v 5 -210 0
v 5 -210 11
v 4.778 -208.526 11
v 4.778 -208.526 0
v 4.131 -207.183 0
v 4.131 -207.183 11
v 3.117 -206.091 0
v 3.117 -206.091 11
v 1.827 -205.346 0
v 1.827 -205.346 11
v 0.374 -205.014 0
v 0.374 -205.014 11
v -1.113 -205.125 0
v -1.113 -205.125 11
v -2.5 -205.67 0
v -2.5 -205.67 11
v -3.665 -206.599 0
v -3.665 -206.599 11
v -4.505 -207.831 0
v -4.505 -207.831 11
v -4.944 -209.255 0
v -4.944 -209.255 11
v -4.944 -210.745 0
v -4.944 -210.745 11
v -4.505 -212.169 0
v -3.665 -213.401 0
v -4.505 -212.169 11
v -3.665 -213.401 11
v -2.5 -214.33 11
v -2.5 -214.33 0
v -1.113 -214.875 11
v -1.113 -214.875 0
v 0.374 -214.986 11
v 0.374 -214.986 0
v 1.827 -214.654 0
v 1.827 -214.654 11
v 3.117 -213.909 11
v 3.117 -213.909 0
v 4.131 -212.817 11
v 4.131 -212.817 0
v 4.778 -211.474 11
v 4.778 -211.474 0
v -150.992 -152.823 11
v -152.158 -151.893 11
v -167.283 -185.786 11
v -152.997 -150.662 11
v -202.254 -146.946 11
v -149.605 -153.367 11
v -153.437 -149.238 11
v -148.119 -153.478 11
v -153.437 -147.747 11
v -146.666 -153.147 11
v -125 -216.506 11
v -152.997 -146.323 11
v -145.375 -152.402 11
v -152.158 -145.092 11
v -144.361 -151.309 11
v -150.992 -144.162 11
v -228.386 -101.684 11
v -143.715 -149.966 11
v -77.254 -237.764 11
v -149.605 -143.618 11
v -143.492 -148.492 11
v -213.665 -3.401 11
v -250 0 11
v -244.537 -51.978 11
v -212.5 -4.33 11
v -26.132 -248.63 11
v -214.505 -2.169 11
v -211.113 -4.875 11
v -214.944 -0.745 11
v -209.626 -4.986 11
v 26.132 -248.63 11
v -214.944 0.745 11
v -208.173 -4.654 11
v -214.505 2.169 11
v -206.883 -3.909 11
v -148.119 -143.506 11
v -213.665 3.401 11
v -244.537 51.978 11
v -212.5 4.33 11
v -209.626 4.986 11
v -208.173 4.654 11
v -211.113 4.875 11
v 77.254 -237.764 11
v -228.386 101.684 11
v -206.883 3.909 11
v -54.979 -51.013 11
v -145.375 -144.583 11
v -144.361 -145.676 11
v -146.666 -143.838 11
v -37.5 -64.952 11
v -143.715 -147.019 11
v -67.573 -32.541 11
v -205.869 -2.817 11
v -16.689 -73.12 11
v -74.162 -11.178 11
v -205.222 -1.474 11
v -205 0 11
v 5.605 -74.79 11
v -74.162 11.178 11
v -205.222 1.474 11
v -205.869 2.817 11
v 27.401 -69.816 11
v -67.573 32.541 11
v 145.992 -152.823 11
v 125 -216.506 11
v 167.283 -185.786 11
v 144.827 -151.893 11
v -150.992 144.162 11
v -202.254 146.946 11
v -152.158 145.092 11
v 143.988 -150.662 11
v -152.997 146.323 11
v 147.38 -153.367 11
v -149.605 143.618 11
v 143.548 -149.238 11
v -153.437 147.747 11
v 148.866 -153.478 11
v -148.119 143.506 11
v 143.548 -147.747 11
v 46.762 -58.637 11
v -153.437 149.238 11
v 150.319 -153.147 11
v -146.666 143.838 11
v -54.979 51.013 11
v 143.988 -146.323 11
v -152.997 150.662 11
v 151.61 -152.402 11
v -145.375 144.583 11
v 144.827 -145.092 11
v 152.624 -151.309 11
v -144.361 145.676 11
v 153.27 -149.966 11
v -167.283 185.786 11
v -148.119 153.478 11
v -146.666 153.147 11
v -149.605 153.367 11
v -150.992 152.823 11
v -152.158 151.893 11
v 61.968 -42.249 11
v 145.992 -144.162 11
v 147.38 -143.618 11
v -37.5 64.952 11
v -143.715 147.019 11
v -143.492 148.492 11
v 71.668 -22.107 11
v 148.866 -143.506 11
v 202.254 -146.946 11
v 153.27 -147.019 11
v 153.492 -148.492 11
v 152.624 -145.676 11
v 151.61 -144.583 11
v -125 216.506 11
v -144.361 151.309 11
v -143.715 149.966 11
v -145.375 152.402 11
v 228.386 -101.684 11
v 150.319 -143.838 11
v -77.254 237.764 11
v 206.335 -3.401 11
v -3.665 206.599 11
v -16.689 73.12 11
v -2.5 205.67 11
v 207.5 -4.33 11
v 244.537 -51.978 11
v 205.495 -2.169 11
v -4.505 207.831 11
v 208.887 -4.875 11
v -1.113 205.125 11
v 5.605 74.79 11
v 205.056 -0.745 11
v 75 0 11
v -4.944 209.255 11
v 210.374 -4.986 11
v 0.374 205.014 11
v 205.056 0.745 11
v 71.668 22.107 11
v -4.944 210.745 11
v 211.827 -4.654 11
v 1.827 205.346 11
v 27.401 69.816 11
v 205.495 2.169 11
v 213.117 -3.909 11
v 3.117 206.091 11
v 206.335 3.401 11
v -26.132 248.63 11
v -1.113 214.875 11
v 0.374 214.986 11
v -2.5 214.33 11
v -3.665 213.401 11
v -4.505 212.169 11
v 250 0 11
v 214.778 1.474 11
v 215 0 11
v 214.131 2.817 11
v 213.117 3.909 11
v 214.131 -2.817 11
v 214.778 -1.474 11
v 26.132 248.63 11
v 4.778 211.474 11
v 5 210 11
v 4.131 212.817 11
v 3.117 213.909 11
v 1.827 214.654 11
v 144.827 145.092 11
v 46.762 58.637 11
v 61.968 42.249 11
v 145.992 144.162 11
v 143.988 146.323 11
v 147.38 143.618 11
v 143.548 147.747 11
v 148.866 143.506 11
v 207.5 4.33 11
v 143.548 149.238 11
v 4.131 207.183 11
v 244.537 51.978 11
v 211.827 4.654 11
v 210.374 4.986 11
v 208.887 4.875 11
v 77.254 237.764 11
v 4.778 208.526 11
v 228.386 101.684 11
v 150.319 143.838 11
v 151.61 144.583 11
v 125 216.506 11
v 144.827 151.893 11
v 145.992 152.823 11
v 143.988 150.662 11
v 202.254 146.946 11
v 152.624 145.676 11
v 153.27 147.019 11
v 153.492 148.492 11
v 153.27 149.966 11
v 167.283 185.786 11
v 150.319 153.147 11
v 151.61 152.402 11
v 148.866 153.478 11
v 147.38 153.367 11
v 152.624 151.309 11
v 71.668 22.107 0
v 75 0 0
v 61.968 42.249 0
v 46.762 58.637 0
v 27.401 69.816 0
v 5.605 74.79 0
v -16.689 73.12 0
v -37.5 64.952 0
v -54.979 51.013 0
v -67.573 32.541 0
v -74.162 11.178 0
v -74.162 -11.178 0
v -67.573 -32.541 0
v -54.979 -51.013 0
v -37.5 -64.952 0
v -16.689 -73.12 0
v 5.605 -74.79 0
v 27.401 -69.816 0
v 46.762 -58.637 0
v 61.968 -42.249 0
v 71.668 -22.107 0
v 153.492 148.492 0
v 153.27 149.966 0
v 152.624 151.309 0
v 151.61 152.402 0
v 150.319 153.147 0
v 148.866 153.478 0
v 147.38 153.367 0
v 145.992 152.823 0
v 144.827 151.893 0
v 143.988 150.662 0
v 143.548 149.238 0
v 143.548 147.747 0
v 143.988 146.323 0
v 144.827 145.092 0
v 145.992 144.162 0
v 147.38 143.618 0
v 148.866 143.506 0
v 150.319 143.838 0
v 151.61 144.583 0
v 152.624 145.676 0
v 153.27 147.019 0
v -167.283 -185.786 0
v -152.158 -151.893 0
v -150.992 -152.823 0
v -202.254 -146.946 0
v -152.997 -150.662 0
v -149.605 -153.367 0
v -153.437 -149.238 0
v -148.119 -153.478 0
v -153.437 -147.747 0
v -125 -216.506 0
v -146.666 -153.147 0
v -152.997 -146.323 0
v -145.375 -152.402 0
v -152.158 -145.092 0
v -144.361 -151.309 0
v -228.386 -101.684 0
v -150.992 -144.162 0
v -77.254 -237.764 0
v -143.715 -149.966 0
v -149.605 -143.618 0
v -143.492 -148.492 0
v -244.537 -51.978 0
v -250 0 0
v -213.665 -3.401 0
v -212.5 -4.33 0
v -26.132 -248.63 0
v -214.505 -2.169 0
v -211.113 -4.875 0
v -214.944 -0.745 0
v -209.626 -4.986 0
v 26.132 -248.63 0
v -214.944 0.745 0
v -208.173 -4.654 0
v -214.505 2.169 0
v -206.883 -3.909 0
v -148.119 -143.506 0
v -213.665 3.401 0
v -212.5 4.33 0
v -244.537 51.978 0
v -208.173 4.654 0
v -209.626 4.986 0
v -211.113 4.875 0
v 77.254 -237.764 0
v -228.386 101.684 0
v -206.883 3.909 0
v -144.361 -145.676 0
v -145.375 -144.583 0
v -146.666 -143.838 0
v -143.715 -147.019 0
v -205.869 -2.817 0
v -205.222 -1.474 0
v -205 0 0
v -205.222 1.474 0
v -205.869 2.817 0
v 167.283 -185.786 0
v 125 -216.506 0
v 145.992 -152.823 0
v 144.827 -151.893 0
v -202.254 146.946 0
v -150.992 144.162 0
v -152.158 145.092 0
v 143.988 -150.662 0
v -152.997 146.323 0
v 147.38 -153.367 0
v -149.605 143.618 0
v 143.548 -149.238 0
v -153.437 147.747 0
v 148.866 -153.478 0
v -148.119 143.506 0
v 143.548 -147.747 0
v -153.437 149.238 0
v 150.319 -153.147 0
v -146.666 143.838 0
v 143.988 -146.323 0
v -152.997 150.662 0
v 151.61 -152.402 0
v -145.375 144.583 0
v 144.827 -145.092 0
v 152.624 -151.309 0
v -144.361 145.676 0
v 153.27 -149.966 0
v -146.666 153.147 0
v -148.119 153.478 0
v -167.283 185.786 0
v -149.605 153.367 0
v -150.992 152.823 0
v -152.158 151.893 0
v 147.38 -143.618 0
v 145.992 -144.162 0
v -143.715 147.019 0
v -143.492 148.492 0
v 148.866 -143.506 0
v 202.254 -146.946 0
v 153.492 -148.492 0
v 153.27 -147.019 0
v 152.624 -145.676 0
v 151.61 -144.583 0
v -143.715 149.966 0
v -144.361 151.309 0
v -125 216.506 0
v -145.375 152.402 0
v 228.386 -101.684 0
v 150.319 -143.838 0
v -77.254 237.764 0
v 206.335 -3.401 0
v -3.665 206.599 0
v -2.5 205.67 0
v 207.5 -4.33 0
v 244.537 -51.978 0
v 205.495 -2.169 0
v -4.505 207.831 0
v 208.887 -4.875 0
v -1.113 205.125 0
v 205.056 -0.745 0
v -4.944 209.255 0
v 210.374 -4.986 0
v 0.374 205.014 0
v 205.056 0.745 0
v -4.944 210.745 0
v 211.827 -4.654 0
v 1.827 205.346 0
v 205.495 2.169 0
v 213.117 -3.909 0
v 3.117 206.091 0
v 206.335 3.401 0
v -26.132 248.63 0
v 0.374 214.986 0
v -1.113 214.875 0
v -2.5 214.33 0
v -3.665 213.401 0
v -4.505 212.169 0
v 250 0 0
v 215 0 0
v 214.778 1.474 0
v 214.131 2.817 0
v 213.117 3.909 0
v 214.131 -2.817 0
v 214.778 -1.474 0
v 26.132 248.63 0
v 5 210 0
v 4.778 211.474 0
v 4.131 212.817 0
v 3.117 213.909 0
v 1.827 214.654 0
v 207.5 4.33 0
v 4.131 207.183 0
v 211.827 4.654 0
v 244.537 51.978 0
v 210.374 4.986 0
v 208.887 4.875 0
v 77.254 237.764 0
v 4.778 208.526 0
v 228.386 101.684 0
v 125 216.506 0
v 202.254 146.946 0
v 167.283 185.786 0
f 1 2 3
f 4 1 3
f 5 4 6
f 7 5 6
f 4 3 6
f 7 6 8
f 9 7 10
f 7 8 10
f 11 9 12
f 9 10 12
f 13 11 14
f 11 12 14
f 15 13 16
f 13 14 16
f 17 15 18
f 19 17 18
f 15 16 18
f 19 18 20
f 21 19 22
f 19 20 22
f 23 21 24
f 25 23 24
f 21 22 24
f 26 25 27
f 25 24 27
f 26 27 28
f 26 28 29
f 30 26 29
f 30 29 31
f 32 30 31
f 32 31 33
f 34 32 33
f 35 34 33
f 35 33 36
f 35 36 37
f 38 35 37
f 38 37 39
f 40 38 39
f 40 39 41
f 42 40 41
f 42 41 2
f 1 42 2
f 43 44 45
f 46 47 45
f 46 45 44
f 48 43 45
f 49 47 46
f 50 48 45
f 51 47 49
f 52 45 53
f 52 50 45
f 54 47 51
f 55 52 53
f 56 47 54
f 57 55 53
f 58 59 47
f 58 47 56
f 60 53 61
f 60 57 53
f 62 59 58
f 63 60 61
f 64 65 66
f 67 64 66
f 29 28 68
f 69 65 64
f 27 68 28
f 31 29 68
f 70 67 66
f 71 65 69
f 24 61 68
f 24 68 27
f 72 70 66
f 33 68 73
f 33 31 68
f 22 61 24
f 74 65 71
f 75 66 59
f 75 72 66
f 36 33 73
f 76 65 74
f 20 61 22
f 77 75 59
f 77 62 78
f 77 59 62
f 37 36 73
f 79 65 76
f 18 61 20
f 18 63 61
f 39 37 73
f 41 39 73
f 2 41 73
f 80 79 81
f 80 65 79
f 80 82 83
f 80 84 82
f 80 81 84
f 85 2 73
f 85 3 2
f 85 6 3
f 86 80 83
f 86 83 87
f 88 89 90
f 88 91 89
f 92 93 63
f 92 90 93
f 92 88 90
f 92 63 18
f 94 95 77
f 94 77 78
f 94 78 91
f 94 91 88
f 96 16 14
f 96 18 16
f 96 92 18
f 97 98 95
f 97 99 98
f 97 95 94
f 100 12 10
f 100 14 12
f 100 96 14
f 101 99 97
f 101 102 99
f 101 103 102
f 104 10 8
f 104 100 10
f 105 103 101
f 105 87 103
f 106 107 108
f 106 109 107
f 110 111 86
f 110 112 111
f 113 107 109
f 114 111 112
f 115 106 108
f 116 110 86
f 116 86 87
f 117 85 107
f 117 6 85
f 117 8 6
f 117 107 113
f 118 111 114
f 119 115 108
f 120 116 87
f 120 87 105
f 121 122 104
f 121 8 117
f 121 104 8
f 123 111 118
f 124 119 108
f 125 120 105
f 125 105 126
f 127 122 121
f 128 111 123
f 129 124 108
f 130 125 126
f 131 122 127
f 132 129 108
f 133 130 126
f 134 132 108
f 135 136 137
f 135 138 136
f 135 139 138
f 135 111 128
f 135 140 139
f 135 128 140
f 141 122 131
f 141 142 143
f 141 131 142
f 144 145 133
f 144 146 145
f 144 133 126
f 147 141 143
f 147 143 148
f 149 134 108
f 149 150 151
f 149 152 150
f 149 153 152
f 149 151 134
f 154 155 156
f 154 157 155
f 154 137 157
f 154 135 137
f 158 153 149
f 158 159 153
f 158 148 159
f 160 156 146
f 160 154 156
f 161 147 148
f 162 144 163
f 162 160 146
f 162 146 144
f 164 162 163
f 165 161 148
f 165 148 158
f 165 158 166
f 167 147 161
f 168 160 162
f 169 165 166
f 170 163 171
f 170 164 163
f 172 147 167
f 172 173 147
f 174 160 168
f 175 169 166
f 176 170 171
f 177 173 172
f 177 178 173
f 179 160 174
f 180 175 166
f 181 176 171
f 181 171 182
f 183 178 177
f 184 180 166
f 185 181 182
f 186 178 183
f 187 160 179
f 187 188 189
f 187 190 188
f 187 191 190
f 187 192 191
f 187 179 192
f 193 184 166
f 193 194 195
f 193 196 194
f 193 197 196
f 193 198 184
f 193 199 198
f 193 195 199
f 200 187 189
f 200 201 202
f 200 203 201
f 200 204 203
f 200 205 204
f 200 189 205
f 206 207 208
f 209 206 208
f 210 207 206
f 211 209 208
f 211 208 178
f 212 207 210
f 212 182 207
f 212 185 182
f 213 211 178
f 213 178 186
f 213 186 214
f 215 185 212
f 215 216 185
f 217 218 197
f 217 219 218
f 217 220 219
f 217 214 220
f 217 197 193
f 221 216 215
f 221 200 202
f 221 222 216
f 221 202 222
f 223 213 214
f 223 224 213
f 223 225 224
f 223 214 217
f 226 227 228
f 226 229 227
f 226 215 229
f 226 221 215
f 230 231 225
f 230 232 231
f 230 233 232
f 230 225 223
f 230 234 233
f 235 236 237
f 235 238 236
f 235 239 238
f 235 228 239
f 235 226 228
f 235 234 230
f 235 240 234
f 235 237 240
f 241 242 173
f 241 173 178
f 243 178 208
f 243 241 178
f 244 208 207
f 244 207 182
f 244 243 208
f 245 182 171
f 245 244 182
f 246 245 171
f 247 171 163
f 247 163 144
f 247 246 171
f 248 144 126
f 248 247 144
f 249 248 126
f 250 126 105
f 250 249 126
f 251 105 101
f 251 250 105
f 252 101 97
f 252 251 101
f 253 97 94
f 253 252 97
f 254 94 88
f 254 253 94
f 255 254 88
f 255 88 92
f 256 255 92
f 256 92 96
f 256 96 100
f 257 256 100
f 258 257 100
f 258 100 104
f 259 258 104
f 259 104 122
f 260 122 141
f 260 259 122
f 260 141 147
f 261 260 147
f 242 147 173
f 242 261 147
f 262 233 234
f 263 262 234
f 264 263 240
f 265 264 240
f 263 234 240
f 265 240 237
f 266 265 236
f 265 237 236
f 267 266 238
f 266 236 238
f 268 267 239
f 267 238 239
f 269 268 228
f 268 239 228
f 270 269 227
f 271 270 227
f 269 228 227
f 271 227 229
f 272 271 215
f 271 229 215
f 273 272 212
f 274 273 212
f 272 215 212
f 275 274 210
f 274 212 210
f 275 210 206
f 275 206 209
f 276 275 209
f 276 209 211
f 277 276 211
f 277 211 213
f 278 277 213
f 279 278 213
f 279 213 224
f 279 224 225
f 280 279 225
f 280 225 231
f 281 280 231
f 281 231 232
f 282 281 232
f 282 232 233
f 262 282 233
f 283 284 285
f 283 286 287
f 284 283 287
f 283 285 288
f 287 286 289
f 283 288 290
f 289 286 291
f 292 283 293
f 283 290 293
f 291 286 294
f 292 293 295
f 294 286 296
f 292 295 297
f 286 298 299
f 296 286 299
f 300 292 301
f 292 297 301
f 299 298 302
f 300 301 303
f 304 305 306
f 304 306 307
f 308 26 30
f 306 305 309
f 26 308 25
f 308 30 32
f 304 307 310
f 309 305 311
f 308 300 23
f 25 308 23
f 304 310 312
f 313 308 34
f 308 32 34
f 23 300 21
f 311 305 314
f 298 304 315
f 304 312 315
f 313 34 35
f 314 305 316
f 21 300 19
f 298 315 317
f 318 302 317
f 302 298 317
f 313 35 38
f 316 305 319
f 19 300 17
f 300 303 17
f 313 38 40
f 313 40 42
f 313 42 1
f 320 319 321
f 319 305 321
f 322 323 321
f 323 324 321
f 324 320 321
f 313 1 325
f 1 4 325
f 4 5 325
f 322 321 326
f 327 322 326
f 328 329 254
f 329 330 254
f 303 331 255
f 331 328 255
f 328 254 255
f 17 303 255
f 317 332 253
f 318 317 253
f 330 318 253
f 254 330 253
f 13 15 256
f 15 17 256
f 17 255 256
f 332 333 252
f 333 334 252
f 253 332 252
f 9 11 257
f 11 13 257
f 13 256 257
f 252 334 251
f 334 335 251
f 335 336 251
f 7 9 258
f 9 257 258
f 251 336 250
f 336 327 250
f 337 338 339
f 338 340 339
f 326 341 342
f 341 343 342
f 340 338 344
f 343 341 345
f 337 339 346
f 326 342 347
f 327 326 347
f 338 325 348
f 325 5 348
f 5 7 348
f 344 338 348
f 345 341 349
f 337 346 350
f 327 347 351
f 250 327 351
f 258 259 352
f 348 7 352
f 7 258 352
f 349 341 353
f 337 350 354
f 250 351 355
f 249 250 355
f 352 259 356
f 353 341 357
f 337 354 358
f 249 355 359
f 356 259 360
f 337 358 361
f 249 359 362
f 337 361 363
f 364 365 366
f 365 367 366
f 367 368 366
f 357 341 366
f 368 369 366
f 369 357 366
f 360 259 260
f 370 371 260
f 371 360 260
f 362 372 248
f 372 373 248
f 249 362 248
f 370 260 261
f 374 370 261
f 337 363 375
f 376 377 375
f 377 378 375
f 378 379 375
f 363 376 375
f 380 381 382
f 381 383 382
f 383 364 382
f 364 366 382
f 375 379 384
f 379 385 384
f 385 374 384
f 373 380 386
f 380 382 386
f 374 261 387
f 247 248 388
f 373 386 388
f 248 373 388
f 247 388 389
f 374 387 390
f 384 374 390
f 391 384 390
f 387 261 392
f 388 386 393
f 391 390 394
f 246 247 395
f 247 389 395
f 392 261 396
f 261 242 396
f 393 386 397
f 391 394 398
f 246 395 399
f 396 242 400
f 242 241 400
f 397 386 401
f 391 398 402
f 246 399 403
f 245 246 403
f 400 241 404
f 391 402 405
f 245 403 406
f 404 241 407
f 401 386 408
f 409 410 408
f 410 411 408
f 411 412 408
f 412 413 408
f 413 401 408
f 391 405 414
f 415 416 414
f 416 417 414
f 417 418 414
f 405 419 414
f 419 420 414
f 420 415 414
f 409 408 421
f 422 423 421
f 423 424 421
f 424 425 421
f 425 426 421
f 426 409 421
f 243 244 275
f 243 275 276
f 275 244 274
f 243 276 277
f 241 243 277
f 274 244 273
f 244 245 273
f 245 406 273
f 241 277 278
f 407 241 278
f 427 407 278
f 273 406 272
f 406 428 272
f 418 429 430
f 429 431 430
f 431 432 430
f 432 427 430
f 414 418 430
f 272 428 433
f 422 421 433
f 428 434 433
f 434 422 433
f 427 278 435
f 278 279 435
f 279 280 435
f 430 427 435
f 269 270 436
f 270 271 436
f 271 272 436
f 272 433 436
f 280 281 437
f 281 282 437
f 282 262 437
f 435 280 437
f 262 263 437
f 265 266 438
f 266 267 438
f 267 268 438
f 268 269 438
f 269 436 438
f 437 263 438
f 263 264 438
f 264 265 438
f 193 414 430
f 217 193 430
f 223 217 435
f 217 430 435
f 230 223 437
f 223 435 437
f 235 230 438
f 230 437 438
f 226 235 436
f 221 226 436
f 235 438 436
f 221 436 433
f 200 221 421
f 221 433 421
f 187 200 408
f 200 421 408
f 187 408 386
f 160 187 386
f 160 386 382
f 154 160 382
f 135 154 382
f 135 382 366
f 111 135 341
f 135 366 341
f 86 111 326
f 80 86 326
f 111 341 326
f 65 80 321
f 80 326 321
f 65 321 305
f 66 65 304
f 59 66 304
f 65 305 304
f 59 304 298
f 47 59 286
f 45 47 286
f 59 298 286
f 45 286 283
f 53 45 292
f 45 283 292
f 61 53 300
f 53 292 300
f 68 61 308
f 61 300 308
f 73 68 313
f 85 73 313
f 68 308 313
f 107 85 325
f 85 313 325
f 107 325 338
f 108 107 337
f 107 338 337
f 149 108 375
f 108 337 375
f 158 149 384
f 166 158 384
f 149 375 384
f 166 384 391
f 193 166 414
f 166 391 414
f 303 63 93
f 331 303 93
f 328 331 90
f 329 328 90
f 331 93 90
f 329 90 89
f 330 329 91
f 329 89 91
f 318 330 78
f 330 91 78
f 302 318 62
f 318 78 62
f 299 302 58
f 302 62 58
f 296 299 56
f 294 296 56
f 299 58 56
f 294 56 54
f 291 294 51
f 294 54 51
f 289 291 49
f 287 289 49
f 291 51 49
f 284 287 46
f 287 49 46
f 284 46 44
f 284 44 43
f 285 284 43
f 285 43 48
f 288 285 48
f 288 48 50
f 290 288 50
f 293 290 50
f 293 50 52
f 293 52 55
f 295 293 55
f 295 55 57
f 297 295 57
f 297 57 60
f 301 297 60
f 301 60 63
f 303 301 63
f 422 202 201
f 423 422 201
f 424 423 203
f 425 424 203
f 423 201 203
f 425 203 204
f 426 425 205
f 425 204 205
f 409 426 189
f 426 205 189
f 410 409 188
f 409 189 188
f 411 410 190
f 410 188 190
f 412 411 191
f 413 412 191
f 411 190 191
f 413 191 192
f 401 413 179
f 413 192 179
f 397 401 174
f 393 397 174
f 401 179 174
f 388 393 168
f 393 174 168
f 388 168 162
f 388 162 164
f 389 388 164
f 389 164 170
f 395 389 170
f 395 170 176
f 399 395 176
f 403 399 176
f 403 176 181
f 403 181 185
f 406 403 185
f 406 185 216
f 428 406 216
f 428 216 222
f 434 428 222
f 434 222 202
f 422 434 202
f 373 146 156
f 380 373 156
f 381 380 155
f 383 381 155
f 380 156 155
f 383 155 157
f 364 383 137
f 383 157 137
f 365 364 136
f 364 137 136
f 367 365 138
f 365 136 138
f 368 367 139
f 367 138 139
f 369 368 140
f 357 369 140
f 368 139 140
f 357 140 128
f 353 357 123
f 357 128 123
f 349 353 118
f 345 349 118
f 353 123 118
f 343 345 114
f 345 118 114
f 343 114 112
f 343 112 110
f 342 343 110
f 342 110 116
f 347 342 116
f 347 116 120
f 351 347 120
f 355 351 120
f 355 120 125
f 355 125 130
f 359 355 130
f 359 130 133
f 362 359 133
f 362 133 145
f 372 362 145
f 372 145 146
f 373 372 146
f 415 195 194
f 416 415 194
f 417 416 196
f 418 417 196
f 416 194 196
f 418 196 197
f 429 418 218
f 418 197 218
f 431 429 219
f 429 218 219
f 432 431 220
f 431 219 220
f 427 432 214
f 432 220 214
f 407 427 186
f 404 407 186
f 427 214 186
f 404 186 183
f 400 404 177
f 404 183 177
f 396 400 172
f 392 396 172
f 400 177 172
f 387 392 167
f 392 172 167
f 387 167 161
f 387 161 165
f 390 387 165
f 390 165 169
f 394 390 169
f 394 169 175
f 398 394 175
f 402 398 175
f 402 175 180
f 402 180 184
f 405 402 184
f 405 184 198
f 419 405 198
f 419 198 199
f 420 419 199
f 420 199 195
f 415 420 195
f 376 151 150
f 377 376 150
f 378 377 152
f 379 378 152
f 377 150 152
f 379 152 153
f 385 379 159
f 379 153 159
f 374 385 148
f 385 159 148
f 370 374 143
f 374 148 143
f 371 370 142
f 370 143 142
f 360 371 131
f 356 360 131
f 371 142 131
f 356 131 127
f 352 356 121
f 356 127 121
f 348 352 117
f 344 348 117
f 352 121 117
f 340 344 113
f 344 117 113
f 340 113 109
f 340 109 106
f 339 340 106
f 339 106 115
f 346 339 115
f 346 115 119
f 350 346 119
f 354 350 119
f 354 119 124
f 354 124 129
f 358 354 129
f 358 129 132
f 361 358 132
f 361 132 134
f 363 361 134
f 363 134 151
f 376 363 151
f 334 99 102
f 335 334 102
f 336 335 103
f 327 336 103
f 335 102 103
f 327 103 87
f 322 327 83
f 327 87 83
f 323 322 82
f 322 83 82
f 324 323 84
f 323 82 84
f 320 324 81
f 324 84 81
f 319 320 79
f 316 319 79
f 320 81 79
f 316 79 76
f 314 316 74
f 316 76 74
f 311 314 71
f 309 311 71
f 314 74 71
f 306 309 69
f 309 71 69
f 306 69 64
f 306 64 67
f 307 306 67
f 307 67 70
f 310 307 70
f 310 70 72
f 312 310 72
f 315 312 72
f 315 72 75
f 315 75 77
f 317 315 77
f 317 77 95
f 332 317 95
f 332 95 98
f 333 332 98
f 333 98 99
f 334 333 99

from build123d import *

# Parameters (mm, degrees)
SKETCH2_R           = 250
SKETCH2_R_2         = 75
BOSS_EXTRUDE1_DEPTH = 11
SKETCH3_R           = 5
CUT_EXTRUDE1_DEPTH  = 354.724469043


with BuildPart() as part:
    # Sketch2 → Boss-Extrude1 (new body)
    with BuildSketch(Plane.XY):
        Circle(SKETCH2_R)
        Circle(SKETCH2_R_2, mode=Mode.SUBTRACT)
    extrude(amount=BOSS_EXTRUDE1_DEPTH)

    # Sketch3 → Cut-Extrude1 (cut, through all)
    with BuildSketch(Plane.XY.offset(11)):
        with Locations((0, 210)):
            Circle(SKETCH3_R)
        with Locations((148.492424049, 148.492424049)):
            Circle(SKETCH3_R)
        with Locations((210, 0)):
            Circle(SKETCH3_R)
        with Locations((148.492424049, -148.492424049)):
            Circle(SKETCH3_R)
        with Locations((0, -210)):
            Circle(SKETCH3_R)
        with Locations((-148.492424049, -148.492424049)):
            Circle(SKETCH3_R)
        with Locations((-210, 0)):
            Circle(SKETCH3_R)
        with Locations((-148.492424049, 148.492424049)):
            Circle(SKETCH3_R)
    extrude(amount=-CUT_EXTRUDE1_DEPTH, mode=Mode.SUBTRACT)


solid = part.part
